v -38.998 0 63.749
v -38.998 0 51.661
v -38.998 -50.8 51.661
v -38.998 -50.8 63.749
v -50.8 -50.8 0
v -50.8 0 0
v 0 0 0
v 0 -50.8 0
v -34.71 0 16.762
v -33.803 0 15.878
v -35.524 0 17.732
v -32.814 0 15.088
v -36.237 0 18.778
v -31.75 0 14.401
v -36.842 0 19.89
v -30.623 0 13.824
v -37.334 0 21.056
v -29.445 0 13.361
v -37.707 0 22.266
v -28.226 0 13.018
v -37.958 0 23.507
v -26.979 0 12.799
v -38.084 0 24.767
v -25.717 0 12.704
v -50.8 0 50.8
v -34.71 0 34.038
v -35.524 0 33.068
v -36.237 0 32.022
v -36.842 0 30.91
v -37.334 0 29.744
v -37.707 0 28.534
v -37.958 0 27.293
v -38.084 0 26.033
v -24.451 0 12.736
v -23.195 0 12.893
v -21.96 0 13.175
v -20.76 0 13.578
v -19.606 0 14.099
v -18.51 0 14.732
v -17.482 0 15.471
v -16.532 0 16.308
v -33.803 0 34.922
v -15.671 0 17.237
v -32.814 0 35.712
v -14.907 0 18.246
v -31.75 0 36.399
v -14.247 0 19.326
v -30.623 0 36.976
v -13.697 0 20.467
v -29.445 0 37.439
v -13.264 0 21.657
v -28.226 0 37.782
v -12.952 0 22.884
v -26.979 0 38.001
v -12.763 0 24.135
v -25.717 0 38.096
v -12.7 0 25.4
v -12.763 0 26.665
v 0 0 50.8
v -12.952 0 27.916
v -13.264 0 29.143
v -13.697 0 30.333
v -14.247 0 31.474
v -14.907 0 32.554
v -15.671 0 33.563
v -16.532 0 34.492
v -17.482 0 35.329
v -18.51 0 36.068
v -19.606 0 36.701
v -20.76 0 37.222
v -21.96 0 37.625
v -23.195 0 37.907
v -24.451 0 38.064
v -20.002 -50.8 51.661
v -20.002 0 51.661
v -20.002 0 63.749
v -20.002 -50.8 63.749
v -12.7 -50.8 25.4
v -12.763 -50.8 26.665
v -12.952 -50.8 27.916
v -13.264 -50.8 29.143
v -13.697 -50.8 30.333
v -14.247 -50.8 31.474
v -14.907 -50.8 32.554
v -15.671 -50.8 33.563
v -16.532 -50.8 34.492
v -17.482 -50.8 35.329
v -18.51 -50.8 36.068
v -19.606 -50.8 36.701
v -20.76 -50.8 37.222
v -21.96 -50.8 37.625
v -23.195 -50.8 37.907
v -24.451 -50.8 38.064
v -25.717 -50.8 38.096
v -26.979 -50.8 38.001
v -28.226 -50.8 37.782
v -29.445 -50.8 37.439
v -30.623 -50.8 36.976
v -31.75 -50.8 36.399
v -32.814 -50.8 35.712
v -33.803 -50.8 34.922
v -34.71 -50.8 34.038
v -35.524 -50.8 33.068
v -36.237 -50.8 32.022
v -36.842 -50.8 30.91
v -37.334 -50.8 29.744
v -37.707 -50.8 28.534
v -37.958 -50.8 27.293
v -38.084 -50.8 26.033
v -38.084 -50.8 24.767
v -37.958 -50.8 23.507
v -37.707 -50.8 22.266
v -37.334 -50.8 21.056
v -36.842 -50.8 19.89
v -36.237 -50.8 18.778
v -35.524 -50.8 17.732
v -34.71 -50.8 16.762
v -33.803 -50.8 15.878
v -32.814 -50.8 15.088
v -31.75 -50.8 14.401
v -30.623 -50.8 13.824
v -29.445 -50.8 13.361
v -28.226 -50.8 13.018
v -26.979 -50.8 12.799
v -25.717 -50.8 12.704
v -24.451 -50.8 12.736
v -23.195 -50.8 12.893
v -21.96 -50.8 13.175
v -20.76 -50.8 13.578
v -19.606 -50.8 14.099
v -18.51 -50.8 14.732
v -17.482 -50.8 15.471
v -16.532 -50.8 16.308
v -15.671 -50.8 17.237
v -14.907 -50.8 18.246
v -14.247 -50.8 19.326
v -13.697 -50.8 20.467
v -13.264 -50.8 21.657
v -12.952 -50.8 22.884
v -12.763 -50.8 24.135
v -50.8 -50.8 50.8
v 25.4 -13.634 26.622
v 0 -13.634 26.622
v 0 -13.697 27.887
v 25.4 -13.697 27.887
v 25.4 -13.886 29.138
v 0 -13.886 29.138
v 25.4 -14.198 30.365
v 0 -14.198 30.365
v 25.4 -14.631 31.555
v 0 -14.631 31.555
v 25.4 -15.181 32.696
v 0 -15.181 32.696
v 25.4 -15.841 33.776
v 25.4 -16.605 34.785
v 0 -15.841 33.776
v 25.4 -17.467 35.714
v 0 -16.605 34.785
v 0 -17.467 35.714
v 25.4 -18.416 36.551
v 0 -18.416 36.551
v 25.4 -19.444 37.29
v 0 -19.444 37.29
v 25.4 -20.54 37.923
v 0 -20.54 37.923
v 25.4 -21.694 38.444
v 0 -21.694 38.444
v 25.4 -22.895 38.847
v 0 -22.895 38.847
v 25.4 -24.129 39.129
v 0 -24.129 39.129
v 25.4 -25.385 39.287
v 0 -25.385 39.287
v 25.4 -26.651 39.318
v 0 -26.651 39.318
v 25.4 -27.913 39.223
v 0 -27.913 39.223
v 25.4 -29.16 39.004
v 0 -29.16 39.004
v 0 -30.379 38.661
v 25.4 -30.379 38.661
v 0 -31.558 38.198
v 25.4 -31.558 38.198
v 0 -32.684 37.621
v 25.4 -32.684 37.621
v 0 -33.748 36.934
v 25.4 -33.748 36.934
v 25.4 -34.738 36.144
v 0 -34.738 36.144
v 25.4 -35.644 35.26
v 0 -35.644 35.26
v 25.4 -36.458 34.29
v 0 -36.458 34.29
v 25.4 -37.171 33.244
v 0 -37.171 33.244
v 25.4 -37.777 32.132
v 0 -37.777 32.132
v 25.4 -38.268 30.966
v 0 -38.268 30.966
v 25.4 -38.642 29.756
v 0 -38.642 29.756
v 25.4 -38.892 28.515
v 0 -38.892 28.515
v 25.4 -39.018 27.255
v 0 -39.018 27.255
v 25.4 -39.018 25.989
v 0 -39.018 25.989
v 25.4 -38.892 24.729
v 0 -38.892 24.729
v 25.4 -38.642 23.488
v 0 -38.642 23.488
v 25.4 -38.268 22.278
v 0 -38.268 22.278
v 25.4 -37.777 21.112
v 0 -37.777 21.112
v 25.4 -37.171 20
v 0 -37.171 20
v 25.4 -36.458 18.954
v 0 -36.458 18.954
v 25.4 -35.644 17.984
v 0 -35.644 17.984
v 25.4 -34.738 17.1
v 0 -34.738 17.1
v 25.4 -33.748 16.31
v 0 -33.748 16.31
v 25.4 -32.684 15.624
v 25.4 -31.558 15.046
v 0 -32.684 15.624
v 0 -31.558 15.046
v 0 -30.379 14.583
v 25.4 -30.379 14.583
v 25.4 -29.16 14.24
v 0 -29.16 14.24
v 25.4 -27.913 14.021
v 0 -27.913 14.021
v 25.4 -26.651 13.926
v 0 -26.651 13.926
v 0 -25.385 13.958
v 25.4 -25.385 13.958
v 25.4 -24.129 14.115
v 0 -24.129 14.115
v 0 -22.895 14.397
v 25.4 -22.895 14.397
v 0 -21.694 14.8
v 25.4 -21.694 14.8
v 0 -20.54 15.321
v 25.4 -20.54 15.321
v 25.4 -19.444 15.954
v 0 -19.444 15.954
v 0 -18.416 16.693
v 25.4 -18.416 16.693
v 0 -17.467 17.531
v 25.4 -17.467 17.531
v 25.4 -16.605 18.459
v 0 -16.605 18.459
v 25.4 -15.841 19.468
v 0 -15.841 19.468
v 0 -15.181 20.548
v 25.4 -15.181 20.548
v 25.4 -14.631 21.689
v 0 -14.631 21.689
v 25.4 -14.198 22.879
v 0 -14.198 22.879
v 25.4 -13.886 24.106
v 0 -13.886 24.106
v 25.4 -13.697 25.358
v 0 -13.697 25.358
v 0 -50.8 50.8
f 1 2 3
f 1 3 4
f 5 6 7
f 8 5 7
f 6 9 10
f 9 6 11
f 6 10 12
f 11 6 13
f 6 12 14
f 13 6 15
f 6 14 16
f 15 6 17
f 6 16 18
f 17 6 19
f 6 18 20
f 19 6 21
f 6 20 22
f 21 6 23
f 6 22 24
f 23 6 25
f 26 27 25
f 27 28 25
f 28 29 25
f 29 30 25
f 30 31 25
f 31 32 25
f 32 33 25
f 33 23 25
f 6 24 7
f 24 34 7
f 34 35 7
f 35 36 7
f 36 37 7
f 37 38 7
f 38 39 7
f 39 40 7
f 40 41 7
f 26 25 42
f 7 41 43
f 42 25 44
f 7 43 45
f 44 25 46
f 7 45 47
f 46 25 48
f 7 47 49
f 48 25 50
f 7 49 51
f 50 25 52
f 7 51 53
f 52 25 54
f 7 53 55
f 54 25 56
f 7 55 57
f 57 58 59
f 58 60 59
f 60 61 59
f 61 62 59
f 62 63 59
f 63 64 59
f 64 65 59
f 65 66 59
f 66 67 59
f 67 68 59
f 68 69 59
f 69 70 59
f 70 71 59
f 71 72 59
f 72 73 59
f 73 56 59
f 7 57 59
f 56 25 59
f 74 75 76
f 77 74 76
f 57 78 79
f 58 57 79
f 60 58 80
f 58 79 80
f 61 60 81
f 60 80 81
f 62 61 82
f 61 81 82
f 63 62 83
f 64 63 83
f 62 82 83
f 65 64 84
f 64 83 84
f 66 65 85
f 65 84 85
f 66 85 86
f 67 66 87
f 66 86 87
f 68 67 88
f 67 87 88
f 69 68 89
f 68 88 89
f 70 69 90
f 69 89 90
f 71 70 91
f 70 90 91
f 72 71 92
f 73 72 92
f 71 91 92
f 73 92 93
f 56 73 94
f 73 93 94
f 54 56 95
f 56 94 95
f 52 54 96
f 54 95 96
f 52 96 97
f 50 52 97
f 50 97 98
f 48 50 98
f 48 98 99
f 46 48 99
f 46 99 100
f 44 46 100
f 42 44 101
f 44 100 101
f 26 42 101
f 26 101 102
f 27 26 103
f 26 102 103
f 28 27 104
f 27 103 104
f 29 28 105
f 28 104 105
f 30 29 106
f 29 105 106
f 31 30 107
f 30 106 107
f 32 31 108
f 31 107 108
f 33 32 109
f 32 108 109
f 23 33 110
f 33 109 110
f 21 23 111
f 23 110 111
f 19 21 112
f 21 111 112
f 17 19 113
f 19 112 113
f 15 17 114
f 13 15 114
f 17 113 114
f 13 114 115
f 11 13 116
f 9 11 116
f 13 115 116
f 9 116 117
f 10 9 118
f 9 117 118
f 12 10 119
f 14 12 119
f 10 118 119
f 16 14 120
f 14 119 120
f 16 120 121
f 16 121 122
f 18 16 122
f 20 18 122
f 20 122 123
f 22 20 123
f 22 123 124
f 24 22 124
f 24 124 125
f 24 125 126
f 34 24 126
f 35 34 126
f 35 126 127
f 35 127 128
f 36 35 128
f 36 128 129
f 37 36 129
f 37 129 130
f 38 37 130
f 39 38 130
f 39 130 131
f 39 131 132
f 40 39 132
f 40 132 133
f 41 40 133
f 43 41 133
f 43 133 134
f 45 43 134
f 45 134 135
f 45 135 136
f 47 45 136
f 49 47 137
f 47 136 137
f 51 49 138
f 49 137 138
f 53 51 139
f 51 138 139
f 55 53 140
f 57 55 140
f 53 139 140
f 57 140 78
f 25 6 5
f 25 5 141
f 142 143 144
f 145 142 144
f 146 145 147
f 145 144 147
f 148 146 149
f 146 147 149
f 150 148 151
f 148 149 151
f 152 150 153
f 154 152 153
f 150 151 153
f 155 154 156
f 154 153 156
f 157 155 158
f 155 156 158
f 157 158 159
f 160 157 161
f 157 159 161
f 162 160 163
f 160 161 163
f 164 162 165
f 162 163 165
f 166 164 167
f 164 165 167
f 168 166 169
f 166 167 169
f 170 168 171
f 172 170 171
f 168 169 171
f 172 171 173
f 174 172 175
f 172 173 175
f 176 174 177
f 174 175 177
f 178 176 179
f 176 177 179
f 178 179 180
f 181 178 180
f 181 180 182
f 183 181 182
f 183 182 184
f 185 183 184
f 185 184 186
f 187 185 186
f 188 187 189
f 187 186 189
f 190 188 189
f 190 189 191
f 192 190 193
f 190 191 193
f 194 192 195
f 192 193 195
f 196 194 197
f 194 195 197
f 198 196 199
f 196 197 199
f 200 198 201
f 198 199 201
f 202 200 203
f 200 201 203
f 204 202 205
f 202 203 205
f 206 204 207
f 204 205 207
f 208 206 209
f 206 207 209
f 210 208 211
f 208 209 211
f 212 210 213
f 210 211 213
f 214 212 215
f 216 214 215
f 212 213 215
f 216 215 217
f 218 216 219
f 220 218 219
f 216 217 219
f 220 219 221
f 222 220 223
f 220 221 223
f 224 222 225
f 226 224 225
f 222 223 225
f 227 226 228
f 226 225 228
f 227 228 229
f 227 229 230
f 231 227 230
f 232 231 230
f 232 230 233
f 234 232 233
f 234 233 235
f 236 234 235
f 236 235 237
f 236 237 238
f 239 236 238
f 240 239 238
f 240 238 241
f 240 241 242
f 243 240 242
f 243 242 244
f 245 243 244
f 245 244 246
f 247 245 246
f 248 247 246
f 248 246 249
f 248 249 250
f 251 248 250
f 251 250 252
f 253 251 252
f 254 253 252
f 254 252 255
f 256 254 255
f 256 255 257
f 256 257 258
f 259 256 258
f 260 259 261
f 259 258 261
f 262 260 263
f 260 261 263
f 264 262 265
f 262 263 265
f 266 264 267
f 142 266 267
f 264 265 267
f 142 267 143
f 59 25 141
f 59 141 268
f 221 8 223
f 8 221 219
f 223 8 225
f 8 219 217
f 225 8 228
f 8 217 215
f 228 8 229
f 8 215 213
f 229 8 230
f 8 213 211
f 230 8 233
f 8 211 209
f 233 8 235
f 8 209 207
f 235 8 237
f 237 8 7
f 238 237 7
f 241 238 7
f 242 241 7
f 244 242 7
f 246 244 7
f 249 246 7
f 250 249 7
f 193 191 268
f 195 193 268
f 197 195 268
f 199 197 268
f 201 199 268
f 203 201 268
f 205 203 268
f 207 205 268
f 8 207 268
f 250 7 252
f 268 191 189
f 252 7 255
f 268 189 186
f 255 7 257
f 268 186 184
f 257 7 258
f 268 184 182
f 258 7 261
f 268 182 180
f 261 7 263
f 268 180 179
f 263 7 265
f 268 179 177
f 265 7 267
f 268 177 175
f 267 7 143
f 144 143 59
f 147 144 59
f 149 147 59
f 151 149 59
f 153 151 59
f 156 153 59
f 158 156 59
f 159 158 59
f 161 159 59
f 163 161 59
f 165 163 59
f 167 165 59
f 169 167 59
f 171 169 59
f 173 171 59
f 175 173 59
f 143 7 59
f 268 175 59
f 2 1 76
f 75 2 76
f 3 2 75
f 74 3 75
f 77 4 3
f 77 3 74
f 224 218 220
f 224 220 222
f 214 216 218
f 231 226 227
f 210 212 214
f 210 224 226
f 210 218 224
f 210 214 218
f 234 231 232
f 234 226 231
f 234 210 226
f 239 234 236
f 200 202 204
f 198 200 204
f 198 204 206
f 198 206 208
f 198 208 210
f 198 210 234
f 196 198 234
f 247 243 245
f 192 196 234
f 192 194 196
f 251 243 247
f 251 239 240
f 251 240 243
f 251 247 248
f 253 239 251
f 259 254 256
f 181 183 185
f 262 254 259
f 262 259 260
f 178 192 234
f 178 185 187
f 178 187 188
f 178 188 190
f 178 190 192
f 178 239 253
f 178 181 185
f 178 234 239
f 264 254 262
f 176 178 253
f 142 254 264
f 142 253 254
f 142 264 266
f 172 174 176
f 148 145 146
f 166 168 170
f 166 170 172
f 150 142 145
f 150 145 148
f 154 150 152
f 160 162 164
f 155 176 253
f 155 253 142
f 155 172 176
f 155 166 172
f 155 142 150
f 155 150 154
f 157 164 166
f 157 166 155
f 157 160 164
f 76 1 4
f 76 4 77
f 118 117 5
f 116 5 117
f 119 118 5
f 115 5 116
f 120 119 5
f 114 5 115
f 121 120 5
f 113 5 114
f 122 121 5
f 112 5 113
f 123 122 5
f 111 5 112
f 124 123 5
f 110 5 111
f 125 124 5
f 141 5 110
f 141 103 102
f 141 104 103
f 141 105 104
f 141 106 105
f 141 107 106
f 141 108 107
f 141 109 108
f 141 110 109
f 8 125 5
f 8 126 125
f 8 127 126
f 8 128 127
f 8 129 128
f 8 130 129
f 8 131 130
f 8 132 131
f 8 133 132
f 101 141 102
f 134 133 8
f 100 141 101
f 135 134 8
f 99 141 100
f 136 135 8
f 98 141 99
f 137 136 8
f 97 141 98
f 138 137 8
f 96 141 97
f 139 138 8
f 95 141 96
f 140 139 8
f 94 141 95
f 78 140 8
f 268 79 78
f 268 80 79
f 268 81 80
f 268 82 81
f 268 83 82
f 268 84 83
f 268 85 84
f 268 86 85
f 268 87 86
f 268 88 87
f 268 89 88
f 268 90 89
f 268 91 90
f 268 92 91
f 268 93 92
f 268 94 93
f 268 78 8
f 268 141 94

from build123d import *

# Parameters (mm, degrees)
F0_W     = 50.8
F0_H     = 50.8
F1_DEPTH = 50.8
F2_R     = 12.7
F3_DEPTH = 50.8
F4_W     = 18.995181
F4_H     = 12.087844
F5_DEPTH = 50.8
F6_R     = 12.7
F7_DEPTH = 25.4


with BuildPart() as f1:
    # F0 (on Front) → F1 (new body)
    with BuildSketch(Plane.XZ):
        with Locations((-25.4, 25.4)):
            Rectangle(F0_W, F0_H)
    extrude(amount=F1_DEPTH)

    # F2 (on face) → F3 (cut)
    with BuildSketch(Plane.XZ.offset(50.8)):
        with Locations((-25.4, 25.4)):
            Circle(F2_R)
    extrude(amount=-F3_DEPTH, mode=Mode.SUBTRACT)

    # F6 (on Right) → F7 (join)
    with BuildSketch(Plane.YZ):
        with Locations((-26.334226, 26.622033)):
            Circle(F6_R)
    extrude(amount=F7_DEPTH)


with BuildPart() as f5:
    # F4 (on Front) → F5 (new body)
    with BuildSketch(Plane.XZ):
        with Locations((-29.500089, 57.705056)):
            Rectangle(F4_W, F4_H)
    extrude(amount=F5_DEPTH)


solid = Compound([f1.part, f5.part])
